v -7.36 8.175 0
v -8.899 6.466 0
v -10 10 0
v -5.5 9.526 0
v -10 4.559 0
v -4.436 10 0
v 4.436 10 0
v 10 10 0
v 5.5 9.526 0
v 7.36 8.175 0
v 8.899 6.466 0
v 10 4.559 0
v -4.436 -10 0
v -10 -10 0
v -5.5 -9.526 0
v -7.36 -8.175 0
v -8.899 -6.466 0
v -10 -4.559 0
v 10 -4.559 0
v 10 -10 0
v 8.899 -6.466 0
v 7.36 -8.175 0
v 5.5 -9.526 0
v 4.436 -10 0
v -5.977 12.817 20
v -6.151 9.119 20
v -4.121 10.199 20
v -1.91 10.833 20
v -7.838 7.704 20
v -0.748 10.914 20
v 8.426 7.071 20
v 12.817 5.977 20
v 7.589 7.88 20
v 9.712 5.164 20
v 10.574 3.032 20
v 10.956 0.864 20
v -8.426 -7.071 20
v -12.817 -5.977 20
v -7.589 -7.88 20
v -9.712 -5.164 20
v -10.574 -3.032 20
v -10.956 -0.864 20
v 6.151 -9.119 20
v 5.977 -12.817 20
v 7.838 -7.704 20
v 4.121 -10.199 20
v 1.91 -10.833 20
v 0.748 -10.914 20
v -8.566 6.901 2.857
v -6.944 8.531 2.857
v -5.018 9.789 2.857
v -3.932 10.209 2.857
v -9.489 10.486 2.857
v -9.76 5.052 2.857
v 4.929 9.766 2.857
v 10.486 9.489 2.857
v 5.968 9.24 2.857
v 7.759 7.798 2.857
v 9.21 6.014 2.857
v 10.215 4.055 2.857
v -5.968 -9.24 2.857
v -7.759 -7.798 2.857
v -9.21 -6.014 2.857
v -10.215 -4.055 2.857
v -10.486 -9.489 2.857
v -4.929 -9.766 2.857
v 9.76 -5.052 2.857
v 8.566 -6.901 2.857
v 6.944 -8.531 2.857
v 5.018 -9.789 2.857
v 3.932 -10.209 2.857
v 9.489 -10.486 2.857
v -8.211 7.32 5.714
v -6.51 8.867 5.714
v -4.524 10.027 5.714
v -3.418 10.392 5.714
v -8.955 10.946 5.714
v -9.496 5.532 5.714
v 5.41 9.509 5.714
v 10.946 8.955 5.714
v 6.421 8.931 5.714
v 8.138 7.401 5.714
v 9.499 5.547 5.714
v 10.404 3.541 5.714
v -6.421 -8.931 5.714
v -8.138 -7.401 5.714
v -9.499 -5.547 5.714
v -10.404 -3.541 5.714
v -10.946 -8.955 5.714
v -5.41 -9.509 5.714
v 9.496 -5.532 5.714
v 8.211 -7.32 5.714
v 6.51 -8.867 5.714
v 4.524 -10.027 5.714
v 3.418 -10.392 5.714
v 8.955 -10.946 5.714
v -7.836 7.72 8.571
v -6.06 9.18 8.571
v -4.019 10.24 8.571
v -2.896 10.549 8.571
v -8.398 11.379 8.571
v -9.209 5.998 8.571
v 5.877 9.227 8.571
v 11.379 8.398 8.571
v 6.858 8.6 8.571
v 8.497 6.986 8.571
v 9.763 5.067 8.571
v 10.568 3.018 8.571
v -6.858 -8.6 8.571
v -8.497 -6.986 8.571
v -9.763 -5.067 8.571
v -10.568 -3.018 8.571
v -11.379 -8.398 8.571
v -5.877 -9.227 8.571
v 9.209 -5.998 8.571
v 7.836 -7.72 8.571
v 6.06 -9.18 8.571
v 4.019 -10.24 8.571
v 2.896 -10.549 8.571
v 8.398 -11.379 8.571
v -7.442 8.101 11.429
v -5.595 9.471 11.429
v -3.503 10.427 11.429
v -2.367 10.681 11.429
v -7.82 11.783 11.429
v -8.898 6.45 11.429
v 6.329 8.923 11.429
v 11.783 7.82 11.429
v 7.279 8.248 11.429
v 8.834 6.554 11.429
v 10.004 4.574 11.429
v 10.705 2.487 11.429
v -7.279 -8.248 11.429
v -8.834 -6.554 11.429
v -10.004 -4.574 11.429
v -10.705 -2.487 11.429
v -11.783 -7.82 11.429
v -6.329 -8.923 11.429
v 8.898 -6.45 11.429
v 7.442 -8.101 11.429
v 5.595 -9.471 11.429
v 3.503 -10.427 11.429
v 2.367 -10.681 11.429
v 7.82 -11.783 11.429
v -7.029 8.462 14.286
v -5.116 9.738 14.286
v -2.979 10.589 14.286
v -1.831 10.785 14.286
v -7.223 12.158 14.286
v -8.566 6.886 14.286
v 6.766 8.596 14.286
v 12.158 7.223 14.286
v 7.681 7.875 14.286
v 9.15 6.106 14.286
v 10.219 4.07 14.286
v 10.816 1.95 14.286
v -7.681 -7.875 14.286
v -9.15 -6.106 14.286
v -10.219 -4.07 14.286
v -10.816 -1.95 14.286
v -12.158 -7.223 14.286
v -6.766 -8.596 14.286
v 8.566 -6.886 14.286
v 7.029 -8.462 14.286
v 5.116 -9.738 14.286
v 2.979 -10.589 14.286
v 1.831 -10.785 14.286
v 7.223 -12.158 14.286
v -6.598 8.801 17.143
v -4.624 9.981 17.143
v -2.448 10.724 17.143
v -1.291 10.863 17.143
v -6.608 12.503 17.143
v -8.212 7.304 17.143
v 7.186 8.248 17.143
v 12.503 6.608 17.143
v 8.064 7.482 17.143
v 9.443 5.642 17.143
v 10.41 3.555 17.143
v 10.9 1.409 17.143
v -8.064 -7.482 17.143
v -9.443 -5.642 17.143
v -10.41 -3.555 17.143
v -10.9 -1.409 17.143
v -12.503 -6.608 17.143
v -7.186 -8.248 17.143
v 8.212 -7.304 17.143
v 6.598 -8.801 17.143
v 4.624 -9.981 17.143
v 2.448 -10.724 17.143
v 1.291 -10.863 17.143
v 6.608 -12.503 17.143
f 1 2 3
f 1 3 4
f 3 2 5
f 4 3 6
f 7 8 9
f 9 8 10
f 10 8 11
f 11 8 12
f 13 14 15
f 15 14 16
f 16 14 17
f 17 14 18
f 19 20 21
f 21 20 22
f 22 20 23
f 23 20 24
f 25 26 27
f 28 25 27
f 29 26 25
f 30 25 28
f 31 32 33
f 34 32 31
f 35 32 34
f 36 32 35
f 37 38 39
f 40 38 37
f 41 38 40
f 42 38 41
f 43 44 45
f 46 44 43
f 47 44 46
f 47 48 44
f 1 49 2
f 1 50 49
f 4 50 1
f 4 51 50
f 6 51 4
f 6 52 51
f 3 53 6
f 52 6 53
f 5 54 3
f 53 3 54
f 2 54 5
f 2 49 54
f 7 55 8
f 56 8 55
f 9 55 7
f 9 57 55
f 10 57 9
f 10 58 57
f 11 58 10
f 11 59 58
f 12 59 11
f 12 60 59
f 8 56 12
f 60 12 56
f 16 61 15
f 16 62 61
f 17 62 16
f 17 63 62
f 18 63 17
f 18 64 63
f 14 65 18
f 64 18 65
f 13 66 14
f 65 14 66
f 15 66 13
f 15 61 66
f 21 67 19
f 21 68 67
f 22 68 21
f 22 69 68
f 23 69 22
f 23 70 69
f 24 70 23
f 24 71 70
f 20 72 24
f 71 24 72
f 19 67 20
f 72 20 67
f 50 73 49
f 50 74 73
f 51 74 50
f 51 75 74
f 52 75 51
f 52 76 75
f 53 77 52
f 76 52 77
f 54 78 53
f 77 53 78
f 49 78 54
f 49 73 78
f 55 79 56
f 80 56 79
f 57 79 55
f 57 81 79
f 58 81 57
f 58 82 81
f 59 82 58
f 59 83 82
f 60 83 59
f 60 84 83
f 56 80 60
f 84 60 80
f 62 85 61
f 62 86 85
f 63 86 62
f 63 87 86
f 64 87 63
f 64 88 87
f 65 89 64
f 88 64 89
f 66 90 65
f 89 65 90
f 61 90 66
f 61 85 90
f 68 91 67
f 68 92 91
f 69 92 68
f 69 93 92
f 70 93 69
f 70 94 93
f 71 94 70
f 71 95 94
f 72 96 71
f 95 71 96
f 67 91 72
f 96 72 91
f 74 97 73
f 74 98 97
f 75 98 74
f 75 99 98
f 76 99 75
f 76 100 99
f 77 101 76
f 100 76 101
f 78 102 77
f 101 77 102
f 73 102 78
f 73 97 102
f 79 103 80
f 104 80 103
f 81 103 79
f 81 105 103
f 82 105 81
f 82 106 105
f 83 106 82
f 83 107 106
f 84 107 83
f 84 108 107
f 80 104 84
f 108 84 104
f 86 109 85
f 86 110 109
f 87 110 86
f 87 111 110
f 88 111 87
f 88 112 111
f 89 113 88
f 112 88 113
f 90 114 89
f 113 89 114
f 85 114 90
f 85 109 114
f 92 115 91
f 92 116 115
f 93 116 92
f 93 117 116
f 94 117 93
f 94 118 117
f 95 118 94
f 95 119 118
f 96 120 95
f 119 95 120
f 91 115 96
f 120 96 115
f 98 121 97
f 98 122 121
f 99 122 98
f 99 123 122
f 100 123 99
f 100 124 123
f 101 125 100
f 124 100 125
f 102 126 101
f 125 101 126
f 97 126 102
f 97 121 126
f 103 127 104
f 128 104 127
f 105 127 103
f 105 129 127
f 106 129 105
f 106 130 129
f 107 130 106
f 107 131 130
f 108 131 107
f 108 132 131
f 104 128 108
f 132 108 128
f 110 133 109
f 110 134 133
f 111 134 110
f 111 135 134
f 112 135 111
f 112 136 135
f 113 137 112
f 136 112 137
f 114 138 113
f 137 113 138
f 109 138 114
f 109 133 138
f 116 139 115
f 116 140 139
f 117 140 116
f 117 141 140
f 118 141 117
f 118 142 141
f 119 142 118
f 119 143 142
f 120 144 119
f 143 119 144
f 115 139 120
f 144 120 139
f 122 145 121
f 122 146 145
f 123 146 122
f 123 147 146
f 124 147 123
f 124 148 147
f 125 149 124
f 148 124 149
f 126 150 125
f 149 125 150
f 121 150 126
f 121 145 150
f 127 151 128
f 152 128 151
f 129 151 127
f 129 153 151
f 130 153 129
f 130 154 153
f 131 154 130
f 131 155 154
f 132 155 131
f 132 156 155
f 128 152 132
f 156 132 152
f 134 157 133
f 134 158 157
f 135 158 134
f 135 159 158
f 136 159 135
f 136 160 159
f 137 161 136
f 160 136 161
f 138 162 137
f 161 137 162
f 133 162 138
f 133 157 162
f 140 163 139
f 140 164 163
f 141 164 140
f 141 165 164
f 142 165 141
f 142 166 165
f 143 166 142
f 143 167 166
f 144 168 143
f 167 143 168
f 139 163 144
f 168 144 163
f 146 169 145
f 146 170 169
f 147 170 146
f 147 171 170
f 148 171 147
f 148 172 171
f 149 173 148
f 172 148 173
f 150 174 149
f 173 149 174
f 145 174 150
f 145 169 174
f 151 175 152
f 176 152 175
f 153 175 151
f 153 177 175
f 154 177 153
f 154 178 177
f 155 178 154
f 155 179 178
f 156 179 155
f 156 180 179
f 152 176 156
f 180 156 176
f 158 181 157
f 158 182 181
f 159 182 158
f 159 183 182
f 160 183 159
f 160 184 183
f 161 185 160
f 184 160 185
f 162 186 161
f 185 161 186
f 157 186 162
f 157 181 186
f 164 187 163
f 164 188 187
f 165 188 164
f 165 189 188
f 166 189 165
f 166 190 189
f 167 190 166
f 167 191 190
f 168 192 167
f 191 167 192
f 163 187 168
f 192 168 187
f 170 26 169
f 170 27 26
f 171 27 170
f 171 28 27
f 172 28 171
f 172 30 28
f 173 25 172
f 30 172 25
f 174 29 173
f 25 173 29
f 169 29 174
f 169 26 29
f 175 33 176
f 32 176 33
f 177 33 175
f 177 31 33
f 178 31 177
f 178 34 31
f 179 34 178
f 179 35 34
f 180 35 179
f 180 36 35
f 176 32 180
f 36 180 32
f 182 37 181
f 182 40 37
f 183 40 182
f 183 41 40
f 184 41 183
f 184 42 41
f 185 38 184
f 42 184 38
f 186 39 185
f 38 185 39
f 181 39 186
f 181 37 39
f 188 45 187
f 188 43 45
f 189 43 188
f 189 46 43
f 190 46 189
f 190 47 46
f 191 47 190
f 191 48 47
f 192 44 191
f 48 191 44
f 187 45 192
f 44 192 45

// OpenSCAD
linear_extrude(height=20, slices=7, twist=20) {
    difference() {
        square(20, center=true);
        circle(11);
    }
}
